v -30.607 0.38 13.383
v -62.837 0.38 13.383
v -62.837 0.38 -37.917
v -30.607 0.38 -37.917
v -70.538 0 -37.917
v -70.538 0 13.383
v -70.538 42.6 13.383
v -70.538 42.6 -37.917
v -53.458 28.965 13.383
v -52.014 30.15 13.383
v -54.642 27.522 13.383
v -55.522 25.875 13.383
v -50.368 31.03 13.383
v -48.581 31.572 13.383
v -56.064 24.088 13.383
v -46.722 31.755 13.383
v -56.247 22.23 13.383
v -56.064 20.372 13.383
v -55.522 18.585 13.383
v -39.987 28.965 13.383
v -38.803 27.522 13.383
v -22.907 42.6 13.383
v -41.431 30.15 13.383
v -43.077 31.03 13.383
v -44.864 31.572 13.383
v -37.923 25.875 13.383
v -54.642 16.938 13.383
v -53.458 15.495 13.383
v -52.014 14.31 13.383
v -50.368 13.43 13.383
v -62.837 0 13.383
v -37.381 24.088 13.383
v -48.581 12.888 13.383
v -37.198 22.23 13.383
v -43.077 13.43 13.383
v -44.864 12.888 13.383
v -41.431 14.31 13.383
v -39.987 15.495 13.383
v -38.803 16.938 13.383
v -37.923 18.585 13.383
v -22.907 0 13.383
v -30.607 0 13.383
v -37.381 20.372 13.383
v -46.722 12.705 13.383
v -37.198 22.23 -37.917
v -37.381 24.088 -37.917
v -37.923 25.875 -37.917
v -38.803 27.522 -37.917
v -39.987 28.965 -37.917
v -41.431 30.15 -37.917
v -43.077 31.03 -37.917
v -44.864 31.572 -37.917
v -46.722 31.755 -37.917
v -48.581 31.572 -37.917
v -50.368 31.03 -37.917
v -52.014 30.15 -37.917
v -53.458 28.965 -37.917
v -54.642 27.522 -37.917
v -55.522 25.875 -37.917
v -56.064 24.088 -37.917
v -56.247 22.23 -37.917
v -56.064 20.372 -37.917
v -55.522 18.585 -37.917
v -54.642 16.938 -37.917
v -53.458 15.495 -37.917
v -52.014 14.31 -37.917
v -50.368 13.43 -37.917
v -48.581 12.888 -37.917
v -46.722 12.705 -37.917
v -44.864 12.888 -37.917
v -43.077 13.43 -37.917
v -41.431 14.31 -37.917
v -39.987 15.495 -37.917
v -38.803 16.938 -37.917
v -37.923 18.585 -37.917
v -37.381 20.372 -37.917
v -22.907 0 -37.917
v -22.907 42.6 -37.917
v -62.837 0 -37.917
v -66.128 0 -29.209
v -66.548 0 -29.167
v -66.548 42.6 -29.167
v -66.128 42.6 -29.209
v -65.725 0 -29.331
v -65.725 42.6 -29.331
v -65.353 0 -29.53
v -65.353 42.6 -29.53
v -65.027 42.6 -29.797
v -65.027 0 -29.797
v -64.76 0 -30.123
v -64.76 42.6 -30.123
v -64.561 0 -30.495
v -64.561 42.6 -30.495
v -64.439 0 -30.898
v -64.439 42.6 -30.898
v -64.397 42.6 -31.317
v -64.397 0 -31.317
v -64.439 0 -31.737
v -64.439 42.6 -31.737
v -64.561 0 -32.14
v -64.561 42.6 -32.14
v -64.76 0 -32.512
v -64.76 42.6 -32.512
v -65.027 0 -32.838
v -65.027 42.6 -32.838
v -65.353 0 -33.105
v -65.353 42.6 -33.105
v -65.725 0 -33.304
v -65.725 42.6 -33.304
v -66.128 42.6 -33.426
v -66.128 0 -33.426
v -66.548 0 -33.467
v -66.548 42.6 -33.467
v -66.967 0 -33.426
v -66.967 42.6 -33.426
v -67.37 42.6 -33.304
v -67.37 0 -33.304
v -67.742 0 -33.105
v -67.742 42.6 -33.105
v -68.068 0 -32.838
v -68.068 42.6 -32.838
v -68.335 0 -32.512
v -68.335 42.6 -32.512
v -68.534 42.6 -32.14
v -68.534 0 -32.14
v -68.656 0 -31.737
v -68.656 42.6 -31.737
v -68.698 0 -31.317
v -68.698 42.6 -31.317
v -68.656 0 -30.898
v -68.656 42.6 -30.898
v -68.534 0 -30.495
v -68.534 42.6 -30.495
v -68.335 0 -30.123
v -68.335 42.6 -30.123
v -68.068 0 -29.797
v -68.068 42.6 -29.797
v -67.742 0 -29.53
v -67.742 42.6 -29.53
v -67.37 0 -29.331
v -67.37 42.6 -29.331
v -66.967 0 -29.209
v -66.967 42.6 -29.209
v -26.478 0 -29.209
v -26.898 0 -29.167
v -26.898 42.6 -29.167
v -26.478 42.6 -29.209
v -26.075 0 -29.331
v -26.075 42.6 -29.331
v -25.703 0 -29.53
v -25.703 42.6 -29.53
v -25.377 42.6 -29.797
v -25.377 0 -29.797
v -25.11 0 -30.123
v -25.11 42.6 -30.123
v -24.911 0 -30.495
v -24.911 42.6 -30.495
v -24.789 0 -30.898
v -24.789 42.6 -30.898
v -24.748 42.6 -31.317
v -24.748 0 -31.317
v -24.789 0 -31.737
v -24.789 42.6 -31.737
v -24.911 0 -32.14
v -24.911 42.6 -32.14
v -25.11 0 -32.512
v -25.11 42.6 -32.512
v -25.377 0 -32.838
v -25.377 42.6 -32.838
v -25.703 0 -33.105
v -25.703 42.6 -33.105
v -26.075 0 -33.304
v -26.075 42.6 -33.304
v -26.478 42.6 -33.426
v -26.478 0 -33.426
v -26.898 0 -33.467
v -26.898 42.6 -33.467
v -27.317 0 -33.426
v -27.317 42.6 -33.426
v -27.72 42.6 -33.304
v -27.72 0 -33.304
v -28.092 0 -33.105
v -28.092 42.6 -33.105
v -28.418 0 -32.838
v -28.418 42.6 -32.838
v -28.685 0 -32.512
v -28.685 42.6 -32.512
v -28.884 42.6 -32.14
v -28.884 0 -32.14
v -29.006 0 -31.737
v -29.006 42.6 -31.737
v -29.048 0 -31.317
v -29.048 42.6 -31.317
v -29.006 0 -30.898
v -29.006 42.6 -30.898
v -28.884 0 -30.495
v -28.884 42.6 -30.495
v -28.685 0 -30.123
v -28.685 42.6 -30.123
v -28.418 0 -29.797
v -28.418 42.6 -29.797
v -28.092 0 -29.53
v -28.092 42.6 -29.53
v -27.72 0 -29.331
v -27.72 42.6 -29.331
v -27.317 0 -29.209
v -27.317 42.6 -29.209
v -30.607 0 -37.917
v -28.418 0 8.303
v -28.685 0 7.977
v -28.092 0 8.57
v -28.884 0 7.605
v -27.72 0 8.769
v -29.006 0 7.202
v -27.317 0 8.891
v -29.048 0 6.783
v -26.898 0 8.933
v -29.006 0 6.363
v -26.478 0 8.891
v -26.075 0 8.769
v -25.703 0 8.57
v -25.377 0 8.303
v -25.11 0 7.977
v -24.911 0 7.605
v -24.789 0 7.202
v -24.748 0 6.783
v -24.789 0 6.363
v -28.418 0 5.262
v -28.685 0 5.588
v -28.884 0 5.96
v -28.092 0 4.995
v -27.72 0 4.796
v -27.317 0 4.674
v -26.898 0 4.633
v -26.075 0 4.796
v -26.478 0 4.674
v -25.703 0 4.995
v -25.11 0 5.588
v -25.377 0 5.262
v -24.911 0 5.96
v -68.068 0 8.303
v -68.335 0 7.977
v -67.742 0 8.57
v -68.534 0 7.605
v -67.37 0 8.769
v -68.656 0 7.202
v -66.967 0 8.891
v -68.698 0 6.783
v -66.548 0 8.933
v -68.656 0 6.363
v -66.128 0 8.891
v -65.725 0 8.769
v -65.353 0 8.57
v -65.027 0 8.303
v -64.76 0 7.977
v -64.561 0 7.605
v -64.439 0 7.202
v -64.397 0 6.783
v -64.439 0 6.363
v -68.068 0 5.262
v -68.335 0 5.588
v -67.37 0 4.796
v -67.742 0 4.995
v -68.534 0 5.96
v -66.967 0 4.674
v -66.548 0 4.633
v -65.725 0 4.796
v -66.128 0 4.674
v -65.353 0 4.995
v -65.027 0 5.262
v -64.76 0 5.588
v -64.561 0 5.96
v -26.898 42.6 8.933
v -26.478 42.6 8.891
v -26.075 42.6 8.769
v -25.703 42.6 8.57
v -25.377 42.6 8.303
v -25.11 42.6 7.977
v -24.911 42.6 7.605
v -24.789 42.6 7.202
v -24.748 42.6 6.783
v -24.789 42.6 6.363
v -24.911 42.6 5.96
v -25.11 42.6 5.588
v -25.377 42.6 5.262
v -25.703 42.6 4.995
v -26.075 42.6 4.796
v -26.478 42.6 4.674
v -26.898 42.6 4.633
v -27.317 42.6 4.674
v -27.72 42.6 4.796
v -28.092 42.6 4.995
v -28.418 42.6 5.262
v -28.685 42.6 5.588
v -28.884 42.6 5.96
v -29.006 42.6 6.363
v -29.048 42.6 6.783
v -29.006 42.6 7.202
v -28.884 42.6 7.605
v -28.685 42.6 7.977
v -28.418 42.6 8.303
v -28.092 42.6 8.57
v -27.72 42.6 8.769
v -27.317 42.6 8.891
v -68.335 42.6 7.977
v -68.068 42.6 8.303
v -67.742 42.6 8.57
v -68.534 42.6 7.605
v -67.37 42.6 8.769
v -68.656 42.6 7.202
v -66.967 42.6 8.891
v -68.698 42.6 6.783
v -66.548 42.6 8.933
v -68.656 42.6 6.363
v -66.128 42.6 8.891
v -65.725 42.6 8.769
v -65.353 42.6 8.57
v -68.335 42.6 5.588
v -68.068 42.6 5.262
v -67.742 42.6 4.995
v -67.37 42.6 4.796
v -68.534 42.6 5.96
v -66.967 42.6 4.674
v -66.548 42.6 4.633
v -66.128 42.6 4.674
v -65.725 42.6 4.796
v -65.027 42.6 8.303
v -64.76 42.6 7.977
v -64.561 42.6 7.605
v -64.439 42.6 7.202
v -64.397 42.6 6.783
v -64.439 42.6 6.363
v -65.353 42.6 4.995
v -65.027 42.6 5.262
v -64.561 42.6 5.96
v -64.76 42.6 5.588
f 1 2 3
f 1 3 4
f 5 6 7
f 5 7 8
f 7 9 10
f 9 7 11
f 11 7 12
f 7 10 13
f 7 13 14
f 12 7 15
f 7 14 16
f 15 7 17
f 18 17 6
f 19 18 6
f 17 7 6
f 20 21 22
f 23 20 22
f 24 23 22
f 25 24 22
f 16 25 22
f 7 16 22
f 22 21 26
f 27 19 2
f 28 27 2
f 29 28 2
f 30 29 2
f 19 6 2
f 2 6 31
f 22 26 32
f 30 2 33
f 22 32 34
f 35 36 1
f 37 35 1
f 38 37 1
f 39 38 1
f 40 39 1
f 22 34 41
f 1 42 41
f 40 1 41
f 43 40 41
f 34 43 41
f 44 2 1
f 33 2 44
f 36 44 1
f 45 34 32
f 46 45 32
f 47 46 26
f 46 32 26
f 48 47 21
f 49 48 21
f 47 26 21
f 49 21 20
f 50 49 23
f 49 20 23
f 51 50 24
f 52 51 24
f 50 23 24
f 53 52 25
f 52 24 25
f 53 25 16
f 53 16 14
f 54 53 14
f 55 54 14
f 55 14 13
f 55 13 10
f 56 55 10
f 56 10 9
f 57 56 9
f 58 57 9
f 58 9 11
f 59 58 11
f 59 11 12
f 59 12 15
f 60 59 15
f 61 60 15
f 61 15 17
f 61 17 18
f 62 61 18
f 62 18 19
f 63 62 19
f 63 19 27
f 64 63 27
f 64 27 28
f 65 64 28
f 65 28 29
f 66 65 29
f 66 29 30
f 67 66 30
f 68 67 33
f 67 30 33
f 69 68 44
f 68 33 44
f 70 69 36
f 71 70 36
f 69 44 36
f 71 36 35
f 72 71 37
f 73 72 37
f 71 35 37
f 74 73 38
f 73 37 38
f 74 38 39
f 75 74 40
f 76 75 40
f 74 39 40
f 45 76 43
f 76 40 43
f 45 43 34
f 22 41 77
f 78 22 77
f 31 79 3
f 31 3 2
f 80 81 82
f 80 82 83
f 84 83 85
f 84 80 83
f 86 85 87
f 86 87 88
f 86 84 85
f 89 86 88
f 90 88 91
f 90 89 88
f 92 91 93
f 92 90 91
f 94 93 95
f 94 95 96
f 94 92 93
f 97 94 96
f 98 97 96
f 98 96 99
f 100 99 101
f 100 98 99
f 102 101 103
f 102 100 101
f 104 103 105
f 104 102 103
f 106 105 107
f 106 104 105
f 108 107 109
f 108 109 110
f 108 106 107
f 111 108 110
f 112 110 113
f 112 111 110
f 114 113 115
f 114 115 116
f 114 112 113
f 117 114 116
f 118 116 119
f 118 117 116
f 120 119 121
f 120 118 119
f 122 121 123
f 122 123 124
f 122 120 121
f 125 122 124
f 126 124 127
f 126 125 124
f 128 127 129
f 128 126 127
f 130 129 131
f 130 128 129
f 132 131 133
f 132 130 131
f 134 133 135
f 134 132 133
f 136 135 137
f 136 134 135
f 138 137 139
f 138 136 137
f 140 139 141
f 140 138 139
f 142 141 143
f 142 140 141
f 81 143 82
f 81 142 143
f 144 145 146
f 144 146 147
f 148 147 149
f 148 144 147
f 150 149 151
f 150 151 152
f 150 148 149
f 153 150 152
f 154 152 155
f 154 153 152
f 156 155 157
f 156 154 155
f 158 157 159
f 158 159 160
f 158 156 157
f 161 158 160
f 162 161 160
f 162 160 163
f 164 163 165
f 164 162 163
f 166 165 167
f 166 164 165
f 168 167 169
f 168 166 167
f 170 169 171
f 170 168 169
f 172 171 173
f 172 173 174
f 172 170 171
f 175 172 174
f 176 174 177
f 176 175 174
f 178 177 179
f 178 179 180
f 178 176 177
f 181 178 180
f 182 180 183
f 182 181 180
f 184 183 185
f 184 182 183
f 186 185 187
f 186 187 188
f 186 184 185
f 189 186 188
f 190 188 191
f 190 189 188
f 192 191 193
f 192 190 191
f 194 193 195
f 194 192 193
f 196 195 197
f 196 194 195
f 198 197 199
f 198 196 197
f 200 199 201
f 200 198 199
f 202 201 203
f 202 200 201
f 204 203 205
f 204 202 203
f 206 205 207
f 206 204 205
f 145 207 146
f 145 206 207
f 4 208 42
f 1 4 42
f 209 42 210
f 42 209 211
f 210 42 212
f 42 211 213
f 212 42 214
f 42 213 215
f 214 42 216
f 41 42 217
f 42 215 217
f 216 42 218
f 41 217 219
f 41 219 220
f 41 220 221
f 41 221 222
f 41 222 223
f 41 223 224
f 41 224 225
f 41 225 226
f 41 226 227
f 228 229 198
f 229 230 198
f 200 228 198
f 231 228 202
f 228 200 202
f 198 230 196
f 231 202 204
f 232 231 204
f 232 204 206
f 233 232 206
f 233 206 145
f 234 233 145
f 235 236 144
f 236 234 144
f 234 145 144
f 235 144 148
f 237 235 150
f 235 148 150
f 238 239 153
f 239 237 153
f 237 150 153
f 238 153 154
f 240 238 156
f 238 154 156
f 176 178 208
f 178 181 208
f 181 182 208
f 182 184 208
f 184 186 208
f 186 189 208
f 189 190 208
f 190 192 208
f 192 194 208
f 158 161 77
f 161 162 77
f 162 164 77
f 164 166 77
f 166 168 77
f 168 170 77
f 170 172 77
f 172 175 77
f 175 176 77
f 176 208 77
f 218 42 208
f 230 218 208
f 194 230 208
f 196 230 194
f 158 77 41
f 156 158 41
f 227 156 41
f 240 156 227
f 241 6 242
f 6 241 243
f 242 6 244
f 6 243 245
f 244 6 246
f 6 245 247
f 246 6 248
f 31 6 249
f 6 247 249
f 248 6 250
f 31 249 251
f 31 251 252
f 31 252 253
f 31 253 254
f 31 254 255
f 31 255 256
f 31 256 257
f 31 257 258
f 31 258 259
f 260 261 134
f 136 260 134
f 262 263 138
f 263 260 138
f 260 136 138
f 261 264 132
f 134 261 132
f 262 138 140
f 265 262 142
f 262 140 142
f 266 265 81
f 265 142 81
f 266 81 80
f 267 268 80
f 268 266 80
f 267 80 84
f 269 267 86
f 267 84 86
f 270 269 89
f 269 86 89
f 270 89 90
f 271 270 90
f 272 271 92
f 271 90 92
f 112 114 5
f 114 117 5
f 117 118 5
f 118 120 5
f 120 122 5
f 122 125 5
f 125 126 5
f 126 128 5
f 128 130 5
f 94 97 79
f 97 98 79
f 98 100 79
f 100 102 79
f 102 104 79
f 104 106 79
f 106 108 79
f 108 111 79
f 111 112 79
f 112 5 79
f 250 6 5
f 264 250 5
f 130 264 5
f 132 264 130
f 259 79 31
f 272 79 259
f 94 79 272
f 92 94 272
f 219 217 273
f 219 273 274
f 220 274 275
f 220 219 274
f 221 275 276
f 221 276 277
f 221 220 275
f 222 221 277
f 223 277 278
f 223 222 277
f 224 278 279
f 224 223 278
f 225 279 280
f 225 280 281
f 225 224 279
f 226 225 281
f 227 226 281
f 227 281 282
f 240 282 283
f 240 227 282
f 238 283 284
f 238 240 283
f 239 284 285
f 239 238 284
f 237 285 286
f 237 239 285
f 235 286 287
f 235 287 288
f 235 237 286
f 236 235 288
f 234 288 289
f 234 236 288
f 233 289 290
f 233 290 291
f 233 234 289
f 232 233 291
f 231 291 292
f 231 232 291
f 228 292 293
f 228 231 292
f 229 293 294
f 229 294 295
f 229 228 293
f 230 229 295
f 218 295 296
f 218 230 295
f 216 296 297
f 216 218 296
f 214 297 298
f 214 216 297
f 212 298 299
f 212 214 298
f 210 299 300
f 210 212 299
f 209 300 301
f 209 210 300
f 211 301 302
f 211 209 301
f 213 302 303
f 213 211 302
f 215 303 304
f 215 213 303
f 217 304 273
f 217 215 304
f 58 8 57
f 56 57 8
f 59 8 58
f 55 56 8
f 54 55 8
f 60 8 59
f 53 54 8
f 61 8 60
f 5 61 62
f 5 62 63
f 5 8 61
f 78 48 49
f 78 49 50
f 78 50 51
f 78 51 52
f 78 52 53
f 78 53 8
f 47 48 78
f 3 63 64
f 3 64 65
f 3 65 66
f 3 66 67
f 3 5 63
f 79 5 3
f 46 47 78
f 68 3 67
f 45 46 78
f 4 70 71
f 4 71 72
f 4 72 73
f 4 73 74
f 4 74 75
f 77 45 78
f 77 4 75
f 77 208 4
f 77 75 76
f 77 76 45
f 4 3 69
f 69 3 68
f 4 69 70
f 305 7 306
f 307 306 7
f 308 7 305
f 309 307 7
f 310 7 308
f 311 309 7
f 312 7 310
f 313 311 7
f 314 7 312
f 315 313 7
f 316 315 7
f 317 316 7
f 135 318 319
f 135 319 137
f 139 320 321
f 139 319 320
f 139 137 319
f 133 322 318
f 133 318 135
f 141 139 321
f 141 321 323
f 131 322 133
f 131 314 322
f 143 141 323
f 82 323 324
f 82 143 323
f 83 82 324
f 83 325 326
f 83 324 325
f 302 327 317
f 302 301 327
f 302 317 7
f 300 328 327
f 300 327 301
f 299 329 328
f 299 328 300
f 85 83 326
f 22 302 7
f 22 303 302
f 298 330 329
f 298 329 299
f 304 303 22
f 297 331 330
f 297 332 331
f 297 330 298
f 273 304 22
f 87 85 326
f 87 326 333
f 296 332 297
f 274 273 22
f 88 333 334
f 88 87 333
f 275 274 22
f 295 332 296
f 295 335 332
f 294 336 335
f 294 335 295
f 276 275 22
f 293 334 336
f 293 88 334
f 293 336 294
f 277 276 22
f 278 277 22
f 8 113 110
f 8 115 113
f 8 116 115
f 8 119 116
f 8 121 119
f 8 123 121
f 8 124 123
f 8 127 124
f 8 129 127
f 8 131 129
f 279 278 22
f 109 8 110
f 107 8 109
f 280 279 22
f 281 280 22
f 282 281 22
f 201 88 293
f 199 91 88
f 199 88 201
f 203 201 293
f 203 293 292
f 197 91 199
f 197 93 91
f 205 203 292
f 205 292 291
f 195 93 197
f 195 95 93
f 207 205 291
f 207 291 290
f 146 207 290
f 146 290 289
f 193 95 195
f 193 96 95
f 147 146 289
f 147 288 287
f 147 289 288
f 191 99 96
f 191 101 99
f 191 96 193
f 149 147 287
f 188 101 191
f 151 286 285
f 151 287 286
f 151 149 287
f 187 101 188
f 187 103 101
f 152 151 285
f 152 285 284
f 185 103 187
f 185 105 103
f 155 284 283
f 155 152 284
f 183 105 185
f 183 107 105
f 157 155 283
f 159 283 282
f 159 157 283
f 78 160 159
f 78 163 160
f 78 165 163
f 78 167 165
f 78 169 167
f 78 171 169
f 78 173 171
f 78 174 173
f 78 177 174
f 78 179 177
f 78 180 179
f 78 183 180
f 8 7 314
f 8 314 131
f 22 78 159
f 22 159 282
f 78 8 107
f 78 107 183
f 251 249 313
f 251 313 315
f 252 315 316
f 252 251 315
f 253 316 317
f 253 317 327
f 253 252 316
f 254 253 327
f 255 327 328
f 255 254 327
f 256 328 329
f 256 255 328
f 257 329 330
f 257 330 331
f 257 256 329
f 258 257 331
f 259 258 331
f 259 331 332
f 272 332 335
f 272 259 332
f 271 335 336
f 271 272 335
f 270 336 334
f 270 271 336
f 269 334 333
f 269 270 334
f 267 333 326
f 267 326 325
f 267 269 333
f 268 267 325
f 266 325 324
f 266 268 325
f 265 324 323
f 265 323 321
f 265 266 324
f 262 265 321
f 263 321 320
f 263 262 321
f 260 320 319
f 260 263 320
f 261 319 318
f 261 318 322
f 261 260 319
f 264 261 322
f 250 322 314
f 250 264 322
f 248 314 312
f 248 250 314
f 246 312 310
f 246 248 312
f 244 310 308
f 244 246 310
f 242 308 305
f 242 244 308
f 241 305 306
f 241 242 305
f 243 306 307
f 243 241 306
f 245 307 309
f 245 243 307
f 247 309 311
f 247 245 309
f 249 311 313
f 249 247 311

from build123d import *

# Parameters (mm, degrees)
SKETCH1_W           = 47.63
SKETCH1_H           = 51.3
SKETCH1_R           = 2.15
BOSS_EXTRUDE1_DEPTH = 42.6
SKETCH2_R           = 9.525
CUT_EXTRUDE1_DEPTH  = 98.066930034
SKETCH3_W           = 32.23
SKETCH3_H           = 57.048665503
CUT_EXTRUDE2_DEPTH  = 0.38


with BuildPart() as part:
    # Sketch1 → Boss-Extrude1 (new body)
    with BuildSketch(Plane(origin=(0, 0, 0), x_dir=(1, 0, 0), z_dir=(0, 1, 0))):
        with Locations((-46.7225, 12.267391304)):
            Rectangle(SKETCH1_W, SKETCH1_H)
        with Locations(Location((-66.5475, 31.317391304, 0), (0, 0, 270))):
            Circle(SKETCH1_R, mode=Mode.SUBTRACT)
        with Locations(Location((-26.8975, 31.317391304, 0), (0, 0, 270))):
            Circle(SKETCH1_R, mode=Mode.SUBTRACT)
        with Locations(Location((-66.5475, -6.782608696, 0), (0, 0, 270))):
            Circle(SKETCH1_R, mode=Mode.SUBTRACT)
        with Locations(Location((-26.8975, -6.782608696, 0), (0, 0, 270))):
            Circle(SKETCH1_R, mode=Mode.SUBTRACT)
    extrude(amount=BOSS_EXTRUDE1_DEPTH)

    # Sketch2 → Cut-Extrude1 (cut, through all)
    with BuildSketch(Plane.XY.offset(13.382608696)):
        with Locations((-46.7225, 22.23)):
            Circle(SKETCH2_R)
    extrude(amount=-CUT_EXTRUDE1_DEPTH, mode=Mode.SUBTRACT)

    # Sketch3 → Cut-Extrude2 (cut)
    with BuildSketch(Plane.XZ):
        with Locations((-46.7225, -11.363905652)):
            Rectangle(SKETCH3_W, SKETCH3_H)
    extrude(amount=-CUT_EXTRUDE2_DEPTH, mode=Mode.SUBTRACT)


solid = part.part
